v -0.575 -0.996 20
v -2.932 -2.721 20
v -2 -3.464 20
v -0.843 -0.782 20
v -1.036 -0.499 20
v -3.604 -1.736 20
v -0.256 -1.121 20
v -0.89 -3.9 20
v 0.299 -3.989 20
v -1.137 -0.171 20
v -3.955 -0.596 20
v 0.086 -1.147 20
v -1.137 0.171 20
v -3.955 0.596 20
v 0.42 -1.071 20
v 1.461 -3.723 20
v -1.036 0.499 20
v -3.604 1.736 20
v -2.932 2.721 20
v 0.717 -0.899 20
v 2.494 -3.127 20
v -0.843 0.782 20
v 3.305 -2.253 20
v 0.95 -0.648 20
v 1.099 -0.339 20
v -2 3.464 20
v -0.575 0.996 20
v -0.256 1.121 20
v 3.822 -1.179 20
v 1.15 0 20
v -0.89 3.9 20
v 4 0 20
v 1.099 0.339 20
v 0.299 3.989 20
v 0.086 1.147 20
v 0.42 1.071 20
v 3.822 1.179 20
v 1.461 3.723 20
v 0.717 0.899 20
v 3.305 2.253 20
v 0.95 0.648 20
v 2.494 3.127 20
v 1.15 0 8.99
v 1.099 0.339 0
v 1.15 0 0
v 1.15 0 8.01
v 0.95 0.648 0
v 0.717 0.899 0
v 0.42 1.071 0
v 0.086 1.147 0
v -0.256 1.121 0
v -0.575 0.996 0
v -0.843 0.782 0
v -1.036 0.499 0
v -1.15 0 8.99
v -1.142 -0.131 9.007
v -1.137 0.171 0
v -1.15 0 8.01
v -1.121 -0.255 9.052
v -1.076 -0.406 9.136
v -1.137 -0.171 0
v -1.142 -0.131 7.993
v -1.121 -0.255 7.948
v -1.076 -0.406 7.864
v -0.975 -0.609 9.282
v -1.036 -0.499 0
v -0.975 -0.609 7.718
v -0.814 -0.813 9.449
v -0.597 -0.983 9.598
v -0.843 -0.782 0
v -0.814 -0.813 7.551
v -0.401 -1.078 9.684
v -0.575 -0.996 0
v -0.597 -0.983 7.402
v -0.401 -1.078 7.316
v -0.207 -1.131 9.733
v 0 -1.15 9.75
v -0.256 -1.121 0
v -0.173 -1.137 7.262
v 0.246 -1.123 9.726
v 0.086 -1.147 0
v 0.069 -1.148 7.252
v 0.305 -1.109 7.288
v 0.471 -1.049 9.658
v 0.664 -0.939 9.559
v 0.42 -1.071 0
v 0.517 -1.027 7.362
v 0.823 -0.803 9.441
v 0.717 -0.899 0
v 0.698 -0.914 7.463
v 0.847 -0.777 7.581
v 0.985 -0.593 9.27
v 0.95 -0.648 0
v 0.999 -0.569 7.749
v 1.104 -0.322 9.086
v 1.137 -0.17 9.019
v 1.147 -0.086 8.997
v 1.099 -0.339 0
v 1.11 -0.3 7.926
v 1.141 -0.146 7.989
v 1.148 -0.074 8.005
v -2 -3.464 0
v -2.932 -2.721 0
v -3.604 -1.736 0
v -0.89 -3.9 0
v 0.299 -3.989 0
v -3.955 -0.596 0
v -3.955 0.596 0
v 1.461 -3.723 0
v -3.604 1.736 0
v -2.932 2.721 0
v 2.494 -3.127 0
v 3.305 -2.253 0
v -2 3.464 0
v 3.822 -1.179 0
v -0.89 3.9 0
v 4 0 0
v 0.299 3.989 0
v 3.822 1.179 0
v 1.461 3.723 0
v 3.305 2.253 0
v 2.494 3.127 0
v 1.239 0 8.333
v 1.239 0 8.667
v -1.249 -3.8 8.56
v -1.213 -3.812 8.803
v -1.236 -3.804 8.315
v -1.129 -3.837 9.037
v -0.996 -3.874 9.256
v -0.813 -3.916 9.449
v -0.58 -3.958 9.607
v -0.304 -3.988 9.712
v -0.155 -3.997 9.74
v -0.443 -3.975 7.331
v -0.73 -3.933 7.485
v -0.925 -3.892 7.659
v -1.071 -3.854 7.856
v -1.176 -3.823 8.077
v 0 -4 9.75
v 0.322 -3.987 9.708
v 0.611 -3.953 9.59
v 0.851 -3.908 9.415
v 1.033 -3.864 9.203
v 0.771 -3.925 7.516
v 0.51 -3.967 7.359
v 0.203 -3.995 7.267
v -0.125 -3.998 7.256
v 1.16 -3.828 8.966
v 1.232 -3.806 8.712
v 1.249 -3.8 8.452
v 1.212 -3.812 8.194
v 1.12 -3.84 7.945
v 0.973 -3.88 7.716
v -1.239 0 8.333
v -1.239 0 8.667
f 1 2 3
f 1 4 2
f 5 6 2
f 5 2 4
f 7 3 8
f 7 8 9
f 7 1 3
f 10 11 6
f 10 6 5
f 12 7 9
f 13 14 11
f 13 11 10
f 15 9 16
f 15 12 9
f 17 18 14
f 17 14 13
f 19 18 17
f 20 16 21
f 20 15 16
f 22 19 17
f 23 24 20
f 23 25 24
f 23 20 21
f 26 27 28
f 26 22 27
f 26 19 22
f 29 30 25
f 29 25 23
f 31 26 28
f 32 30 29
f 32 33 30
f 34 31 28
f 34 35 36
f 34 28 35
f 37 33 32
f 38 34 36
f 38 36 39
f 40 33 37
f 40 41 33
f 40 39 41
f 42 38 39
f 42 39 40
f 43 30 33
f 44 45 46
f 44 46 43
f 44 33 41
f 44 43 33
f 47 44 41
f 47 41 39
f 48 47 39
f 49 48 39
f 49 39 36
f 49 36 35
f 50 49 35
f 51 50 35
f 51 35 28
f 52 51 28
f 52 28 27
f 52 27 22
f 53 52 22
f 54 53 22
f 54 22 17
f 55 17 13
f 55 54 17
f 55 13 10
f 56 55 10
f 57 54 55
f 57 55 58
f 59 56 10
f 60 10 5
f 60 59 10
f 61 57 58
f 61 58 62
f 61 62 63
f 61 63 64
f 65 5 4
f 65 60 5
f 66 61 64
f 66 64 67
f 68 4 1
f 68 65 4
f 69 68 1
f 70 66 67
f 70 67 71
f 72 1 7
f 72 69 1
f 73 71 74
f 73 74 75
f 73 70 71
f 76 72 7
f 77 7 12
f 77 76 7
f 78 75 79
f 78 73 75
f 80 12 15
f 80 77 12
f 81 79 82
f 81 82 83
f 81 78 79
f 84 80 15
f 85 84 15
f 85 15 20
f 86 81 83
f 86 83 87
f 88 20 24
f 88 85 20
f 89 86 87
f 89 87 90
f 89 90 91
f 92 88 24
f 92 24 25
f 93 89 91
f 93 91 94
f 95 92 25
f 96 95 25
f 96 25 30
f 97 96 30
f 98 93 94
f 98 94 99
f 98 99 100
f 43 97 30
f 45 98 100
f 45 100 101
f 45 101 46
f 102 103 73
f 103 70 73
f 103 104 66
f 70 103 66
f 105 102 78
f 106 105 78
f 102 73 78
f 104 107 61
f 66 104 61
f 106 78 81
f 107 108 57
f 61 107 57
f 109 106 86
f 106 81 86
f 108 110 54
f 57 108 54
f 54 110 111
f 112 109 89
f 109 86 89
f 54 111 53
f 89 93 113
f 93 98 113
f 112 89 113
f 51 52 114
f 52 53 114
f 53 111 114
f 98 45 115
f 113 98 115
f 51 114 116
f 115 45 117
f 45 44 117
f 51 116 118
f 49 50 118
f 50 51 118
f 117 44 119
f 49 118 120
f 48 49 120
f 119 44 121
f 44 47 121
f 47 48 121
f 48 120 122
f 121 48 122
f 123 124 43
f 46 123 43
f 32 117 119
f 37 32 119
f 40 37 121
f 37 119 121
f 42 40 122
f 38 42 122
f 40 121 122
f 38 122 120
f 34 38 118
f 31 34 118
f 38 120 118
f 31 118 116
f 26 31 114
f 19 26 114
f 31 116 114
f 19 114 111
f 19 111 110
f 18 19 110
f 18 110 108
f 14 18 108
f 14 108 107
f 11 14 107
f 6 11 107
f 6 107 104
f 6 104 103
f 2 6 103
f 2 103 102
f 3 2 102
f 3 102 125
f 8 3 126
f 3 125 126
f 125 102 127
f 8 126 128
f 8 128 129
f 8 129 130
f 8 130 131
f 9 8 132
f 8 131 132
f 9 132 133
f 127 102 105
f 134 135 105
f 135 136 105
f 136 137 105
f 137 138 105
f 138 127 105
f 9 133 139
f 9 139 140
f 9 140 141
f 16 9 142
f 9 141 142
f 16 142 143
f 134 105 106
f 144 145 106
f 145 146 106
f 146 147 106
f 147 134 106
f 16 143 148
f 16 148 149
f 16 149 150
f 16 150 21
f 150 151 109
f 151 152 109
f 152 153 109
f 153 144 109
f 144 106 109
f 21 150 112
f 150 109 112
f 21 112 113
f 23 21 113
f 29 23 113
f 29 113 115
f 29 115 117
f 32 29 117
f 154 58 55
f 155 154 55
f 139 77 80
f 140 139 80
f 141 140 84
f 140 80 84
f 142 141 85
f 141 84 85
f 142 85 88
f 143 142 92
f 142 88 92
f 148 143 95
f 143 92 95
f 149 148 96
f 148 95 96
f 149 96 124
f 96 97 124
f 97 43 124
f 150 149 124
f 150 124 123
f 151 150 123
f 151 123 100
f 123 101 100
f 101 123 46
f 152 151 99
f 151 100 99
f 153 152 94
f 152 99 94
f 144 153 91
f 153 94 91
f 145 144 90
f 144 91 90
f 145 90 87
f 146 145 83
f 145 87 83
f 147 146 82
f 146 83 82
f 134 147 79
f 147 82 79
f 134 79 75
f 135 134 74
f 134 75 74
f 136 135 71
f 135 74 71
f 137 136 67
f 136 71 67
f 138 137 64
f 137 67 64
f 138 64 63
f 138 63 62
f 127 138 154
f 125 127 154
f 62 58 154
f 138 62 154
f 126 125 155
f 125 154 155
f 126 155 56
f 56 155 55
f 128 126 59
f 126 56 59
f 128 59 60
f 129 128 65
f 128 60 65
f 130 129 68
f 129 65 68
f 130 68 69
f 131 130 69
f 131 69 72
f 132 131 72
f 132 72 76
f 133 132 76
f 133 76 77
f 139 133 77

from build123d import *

# Parameters (mm, degrees)
SKETCH1_R           = 4
SKETCH1_R_2         = 1.15
BOSS_EXTRUDE1_DEPTH = 20
SKETCH2_R           = 1.25
CUT_EXTRUDE1_DEPTH  = 10


with BuildPart() as part:
    # Sketch1 → Boss-Extrude1 (new body)
    with BuildSketch(Plane.XY):
        Circle(SKETCH1_R)
        Circle(SKETCH1_R_2, mode=Mode.SUBTRACT)
    extrude(amount=BOSS_EXTRUDE1_DEPTH)

    # Sketch2 → Cut-Extrude1 (cut)
    with BuildSketch(Plane(origin=(0, 0, 0), x_dir=(1, 0, 0), z_dir=(0, 1, 0))):
        with Locations(Location((0, -8.5, 0), (0, 0, 270))):
            Circle(SKETCH2_R)
    extrude(amount=-CUT_EXTRUDE1_DEPTH, mode=Mode.SUBTRACT)


solid = part.part
